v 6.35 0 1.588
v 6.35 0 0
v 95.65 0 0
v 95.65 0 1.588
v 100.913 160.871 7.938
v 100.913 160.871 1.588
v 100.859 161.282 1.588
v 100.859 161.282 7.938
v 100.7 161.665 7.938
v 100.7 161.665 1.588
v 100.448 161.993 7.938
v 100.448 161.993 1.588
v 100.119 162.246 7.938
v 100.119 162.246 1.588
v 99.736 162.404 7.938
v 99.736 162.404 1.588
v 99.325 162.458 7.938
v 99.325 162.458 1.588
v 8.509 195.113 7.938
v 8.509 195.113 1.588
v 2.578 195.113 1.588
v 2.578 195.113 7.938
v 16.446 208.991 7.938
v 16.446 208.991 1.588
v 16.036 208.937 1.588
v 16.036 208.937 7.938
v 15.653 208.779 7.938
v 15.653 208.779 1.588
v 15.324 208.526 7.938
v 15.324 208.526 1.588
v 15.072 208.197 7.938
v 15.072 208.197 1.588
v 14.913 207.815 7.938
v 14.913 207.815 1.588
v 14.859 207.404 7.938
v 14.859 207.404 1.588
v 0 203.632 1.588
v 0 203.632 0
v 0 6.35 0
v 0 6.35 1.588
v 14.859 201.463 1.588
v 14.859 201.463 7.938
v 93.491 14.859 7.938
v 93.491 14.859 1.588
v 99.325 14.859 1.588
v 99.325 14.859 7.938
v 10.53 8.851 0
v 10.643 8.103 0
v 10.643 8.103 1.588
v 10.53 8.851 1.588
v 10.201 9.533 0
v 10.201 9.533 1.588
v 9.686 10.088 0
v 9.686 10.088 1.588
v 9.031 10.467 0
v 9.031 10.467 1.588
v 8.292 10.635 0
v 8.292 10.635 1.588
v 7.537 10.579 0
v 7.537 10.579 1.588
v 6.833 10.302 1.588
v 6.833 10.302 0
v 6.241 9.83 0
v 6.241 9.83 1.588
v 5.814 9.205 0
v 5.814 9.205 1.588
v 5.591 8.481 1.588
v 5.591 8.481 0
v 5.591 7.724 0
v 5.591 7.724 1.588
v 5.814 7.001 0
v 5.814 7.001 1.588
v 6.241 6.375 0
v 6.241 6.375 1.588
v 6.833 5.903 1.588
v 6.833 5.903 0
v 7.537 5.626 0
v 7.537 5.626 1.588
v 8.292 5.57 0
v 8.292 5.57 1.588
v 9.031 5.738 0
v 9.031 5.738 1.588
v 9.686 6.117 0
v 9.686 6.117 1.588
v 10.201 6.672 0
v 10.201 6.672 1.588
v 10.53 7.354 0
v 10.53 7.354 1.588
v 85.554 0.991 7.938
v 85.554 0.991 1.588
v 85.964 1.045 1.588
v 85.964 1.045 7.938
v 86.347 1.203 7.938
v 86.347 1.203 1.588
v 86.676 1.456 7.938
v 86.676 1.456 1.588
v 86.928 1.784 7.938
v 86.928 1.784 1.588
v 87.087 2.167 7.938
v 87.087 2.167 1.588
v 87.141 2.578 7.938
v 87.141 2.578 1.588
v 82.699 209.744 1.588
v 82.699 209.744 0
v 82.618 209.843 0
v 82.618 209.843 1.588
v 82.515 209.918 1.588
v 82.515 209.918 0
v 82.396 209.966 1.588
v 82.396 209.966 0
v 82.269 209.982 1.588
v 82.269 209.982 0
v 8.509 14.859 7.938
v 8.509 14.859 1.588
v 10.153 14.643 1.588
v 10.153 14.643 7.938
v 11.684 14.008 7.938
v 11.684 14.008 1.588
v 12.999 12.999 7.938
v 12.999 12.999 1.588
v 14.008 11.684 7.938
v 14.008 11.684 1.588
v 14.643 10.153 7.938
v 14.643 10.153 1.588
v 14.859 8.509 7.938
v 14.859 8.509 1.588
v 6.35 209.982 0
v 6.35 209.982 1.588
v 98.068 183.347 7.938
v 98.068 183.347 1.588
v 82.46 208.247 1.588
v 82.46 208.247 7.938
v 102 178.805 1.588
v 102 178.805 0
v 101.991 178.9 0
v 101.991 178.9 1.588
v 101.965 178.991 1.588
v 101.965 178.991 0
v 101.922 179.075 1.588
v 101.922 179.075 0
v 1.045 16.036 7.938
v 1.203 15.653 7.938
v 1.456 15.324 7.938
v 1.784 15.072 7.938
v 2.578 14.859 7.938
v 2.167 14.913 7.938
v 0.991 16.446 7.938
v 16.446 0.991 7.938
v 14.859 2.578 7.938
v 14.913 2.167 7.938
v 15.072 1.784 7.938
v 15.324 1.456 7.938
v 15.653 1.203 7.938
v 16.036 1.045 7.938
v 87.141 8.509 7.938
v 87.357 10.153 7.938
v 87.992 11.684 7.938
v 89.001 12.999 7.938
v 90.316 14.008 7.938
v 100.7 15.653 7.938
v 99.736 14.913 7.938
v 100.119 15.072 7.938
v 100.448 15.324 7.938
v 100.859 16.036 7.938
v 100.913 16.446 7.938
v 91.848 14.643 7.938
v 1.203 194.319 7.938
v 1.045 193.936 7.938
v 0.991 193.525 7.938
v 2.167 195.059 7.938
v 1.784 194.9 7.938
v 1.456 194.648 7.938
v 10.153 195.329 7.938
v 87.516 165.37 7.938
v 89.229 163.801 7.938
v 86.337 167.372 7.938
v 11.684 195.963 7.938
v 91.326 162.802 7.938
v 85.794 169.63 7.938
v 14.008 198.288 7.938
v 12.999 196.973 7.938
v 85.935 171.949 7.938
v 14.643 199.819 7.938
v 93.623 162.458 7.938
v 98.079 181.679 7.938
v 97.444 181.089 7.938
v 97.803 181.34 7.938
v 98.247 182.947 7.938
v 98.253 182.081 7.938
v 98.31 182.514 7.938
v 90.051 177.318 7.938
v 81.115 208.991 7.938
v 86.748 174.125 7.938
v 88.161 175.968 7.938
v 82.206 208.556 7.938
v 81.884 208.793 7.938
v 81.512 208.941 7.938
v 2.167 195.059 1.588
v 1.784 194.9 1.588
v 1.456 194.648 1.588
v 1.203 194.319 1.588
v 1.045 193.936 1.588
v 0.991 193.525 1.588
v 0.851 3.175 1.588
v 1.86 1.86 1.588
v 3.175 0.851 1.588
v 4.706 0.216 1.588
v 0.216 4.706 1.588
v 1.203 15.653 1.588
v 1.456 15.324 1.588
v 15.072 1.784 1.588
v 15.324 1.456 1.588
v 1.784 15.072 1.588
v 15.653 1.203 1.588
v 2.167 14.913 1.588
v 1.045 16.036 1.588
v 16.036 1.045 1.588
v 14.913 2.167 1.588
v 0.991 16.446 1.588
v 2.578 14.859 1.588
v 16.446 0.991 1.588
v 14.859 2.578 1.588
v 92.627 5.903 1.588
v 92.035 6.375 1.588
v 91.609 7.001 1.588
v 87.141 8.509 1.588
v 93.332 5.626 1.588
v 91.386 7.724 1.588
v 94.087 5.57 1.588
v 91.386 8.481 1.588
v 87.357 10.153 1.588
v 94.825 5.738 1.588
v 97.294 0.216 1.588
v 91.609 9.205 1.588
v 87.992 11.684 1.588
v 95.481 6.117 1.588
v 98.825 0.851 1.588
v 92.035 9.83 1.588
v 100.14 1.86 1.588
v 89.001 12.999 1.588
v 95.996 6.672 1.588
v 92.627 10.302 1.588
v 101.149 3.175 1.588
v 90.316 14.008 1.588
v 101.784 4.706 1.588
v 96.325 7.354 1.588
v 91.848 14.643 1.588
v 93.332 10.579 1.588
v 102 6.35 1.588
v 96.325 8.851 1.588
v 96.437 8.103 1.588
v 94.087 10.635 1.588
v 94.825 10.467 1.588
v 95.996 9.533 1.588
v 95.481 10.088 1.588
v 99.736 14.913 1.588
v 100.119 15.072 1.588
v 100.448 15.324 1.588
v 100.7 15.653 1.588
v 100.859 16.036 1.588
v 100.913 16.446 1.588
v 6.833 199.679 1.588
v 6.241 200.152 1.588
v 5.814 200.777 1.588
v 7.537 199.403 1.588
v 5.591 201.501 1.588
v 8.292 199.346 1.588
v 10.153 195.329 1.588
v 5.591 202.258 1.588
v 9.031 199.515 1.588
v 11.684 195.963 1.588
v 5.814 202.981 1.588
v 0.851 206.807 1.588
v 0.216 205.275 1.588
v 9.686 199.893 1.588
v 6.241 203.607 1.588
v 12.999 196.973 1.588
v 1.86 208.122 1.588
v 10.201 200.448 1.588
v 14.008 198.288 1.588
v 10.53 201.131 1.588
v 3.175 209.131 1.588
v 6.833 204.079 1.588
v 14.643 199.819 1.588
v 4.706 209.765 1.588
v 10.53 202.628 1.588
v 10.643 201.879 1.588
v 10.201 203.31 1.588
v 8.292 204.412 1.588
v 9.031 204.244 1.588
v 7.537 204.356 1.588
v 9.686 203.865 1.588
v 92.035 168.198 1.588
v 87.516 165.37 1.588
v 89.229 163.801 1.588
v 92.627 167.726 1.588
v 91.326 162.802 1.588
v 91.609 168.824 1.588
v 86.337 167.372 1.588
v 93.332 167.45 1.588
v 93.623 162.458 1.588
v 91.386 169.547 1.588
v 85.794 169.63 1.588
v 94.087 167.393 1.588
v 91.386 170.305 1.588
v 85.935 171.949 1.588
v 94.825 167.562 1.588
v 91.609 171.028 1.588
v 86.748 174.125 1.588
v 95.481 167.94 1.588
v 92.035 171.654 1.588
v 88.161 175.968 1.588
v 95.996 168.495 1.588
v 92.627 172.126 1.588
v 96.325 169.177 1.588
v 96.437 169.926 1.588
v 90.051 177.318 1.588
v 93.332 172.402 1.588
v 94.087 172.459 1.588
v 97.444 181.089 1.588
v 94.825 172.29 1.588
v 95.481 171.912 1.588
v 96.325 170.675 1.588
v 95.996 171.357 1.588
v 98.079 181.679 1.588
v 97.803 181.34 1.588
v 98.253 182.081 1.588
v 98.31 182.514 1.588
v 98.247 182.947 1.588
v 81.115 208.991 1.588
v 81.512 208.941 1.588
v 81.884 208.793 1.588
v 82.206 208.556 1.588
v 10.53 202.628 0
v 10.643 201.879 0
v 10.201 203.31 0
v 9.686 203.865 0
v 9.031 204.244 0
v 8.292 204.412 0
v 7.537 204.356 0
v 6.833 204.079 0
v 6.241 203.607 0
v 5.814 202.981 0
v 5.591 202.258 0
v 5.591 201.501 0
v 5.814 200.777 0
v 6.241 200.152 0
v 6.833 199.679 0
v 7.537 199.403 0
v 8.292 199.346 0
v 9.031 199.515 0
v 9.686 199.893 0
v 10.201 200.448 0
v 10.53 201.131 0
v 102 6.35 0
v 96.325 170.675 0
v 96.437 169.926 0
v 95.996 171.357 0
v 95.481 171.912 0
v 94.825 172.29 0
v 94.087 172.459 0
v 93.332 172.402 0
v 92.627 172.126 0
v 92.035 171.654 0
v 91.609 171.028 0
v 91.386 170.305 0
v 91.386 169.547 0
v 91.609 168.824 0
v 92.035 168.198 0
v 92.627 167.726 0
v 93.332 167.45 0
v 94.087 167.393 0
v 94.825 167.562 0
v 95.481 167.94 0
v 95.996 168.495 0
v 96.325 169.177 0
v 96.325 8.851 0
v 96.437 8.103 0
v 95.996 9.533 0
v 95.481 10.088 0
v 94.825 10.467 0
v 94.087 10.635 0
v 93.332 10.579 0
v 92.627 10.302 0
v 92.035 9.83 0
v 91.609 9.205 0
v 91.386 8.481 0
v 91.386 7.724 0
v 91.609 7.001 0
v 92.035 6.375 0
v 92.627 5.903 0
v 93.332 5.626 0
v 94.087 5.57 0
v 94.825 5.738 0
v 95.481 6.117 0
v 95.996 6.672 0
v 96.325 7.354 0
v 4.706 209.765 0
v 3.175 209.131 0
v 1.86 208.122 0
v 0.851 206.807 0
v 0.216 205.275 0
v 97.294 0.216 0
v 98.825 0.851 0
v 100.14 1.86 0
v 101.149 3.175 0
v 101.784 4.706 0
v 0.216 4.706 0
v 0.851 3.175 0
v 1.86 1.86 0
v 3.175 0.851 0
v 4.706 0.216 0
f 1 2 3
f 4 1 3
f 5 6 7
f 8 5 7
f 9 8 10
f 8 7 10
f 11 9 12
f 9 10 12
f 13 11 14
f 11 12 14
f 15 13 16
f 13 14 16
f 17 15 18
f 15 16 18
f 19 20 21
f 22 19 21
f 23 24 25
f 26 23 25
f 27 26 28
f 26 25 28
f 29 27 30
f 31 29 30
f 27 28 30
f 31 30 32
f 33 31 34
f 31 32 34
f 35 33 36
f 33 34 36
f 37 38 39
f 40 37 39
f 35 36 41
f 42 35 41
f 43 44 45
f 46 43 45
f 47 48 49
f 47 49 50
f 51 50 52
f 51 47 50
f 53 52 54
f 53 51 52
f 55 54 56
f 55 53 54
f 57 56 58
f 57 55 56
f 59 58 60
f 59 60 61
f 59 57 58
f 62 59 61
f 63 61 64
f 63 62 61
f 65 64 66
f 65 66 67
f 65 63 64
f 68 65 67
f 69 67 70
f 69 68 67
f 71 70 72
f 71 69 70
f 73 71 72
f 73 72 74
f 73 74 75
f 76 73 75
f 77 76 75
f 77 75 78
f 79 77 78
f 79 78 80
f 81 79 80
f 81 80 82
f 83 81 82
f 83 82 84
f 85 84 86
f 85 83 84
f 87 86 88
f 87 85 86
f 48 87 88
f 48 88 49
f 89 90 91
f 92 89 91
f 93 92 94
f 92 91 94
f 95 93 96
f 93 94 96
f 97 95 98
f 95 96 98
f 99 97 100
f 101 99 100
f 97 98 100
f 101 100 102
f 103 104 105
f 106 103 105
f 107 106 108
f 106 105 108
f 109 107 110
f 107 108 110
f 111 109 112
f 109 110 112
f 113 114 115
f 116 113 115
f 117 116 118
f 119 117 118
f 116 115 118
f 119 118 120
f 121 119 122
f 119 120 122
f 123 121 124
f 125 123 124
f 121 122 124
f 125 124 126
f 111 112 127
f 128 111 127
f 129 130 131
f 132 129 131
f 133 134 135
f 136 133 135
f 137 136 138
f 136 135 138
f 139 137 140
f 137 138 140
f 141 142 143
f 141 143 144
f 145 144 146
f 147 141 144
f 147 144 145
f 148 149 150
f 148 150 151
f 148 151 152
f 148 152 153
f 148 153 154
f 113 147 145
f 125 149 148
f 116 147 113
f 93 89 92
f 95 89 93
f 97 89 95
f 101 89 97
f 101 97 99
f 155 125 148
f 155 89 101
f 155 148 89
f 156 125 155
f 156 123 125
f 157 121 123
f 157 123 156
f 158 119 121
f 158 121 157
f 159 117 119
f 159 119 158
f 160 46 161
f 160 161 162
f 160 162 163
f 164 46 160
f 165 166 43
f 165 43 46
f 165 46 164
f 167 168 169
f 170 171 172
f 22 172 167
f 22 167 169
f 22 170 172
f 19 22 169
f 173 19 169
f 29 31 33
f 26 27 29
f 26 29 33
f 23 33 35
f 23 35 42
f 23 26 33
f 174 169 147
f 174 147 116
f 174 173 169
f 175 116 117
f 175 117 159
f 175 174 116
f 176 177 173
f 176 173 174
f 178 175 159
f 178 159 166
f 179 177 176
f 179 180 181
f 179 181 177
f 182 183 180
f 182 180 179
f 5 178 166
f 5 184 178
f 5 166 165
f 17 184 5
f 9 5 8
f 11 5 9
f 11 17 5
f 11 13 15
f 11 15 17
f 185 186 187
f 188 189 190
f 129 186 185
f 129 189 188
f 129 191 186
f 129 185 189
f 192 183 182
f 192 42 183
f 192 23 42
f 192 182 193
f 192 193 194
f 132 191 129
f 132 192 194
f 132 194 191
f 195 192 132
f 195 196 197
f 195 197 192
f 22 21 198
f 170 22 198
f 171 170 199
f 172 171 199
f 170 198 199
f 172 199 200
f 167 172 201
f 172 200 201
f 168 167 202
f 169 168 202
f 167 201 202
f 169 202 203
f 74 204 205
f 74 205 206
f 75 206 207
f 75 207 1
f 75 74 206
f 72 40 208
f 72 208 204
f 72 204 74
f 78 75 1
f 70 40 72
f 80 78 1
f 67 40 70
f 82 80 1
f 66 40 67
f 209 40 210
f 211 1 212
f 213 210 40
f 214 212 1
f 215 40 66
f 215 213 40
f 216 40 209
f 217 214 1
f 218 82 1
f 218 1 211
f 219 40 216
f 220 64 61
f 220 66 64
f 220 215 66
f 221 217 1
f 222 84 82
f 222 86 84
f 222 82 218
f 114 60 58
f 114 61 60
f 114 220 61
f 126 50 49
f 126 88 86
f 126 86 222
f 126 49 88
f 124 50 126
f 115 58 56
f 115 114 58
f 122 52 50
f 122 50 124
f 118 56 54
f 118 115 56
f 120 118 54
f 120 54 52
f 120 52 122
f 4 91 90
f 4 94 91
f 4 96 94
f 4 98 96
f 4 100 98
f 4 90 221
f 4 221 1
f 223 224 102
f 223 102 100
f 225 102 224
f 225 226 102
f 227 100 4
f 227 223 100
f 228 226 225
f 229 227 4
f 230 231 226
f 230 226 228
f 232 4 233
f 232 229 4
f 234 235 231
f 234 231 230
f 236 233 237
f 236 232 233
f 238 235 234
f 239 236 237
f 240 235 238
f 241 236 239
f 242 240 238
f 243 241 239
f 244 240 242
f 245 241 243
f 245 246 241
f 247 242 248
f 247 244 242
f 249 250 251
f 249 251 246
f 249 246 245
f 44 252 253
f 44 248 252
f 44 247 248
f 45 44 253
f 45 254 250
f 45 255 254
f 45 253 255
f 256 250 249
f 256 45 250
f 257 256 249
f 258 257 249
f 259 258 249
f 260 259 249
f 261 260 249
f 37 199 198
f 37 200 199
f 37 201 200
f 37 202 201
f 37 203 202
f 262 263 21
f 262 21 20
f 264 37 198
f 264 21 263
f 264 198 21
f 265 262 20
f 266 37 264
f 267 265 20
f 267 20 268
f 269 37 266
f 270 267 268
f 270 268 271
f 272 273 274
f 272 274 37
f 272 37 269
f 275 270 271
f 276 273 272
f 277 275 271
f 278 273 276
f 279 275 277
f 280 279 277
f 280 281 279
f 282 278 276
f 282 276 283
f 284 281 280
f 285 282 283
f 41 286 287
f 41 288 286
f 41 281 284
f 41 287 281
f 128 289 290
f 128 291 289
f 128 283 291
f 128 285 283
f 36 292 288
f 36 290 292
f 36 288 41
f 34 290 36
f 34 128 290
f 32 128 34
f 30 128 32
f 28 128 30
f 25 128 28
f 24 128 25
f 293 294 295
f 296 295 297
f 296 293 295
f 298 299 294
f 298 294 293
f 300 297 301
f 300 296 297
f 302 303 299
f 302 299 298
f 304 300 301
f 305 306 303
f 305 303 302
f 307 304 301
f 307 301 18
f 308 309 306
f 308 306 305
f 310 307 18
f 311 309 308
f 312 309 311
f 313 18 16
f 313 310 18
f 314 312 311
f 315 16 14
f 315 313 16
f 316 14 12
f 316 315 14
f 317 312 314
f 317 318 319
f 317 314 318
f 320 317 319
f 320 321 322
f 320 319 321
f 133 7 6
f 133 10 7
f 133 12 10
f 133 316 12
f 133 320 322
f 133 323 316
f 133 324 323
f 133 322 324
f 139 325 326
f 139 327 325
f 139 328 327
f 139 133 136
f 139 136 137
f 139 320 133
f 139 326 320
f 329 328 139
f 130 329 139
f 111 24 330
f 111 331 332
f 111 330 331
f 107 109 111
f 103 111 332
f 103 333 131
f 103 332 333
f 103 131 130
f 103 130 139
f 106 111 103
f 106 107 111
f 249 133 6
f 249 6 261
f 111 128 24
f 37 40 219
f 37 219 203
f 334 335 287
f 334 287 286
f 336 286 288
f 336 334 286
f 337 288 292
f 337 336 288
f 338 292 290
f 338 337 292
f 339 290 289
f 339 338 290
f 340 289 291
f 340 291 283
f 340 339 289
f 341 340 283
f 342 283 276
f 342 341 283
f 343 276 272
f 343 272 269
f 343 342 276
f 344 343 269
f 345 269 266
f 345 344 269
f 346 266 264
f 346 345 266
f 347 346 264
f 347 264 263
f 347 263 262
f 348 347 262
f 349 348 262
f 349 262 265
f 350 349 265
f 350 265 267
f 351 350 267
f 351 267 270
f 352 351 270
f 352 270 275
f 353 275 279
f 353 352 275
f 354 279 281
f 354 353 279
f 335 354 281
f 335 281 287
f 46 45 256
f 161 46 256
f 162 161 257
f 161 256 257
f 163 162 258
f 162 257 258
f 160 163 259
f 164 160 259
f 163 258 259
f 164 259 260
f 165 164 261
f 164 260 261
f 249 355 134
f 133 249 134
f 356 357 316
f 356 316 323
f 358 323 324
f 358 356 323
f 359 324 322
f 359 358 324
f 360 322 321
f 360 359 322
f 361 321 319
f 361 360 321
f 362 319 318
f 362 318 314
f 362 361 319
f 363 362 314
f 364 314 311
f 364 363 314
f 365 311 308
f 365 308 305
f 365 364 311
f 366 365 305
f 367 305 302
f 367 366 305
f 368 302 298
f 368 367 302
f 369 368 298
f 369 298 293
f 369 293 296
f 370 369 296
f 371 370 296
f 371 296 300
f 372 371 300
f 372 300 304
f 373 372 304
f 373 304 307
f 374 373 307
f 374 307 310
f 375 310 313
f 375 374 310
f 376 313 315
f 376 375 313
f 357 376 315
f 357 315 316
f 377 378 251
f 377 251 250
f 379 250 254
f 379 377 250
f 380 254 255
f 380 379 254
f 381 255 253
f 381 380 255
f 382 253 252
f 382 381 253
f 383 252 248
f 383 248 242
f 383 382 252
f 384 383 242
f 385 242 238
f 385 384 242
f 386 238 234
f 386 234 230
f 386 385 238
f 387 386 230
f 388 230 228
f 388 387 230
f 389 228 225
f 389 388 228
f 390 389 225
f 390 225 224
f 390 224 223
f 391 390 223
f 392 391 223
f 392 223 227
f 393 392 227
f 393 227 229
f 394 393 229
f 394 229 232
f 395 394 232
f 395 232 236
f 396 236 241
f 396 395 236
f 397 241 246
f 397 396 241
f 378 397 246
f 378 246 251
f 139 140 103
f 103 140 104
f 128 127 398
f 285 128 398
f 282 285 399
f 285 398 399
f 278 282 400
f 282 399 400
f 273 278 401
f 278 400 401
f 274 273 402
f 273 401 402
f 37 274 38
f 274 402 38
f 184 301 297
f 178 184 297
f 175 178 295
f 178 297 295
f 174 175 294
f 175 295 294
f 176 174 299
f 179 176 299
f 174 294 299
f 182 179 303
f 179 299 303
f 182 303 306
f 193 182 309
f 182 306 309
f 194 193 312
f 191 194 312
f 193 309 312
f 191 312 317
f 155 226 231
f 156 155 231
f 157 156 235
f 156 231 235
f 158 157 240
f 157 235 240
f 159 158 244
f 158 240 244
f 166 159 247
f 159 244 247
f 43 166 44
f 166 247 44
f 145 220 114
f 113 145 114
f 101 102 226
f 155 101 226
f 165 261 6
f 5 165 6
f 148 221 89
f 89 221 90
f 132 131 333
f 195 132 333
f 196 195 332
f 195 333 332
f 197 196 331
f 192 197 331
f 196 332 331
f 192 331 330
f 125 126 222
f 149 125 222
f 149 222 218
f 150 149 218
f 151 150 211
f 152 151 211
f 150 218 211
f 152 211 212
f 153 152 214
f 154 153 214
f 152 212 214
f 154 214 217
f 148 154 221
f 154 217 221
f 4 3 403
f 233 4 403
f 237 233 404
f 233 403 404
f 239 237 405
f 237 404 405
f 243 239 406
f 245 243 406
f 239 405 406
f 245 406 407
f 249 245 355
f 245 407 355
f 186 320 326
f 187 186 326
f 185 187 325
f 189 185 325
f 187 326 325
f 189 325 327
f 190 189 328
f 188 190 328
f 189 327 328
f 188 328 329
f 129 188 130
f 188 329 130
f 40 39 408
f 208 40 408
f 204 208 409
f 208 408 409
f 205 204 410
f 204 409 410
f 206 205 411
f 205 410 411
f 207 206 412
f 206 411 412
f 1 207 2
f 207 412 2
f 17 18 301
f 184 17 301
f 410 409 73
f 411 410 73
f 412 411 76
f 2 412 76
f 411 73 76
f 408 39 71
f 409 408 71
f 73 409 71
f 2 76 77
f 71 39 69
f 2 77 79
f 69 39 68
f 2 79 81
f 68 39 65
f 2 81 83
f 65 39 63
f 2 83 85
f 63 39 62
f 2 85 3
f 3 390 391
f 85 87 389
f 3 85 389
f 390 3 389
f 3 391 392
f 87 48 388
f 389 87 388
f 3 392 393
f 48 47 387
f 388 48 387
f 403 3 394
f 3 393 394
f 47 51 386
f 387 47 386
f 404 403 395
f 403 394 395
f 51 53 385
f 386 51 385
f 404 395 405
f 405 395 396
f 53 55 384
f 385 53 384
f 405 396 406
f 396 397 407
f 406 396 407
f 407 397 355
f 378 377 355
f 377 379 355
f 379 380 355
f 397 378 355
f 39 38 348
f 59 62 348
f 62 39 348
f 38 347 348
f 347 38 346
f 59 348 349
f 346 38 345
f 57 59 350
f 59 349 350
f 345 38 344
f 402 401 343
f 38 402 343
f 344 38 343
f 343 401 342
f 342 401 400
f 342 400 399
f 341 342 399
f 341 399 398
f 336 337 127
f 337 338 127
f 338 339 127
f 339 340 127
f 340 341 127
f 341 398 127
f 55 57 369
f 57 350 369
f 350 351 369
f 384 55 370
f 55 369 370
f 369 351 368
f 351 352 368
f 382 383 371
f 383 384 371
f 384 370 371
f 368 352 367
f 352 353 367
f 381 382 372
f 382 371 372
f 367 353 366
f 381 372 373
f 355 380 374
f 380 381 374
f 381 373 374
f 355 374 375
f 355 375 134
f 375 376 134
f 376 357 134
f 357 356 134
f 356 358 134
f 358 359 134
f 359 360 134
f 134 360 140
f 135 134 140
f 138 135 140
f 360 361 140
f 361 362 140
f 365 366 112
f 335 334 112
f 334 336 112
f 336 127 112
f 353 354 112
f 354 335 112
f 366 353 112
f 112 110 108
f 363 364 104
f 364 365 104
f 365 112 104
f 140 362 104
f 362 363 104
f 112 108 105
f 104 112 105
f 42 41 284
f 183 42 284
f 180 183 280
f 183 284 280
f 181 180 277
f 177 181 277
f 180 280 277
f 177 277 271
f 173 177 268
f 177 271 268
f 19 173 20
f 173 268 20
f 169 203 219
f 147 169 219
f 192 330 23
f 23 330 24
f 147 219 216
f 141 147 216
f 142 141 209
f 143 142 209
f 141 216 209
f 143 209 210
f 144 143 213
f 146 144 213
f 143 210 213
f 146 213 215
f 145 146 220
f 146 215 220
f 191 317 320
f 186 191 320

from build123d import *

# Parameters (mm, degrees)
F0_R     = 2.54
F1_DEPTH = 1.5875
F3_DEPTH = 6.35


with BuildPart() as f1:
    # F0 (on Top) → F1 (new body)
    with BuildSketch(Plane.XY):
        with BuildLine():
            ThreePointArc((0, 6.35), (1.859872, 1.859872), (6.35, 0))
            Line((6.35, 0), (95.65005, 0))
            ThreePointArc((95.65005, 0), (100.140178, 1.859872), (102.00005, 6.35))
            Line((102.00005, 6.35), (102.00005, 178.805276))
            ThreePointArc((102.00005, 178.805276), (101.980273, 178.945639), (101.922484, 179.075074))
            Line((101.922484, 179.075074), (82.699306, 209.743598))
            ThreePointArc((82.699306, 209.743598), (82.514847, 209.918278), (82.268873, 209.9818))
            Line((82.268873, 209.9818), (6.35, 209.9818))
            ThreePointArc((6.35, 209.9818), (1.859872, 208.121928), (0, 203.6318))
            Line((0, 203.6318), (0, 6.35))
        make_face()
        with Locations((8.1026, 8.1026)):
            Circle(F0_R, mode=Mode.SUBTRACT)
        with Locations((93.89745, 8.1026)):
            Circle(F0_R, mode=Mode.SUBTRACT)
        with Locations((8.1026, 201.8792)):
            Circle(F0_R, mode=Mode.SUBTRACT)
        with Locations((93.89745, 169.926)):
            Circle(F0_R, mode=Mode.SUBTRACT)
    extrude(amount=F1_DEPTH)

    # F2 (on face) → F3 (join)
    with BuildSketch(Plane.XY.offset(1.5875)):
        with BuildLine():
            Line((81.1149, 208.9912), (16.4465, 208.9912))
            ThreePointArc((16.4465, 208.9912), (15.323968, 208.526232), (14.859, 207.4037))
            Line((14.859, 207.4037), (14.859, 201.46264))
            ThreePointArc((14.859, 201.46264), (12.999128, 196.972512), (8.509, 195.11264))
            Line((8.509, 195.11264), (2.5781, 195.11264))
            ThreePointArc((2.5781, 195.11264), (1.455568, 194.647672), (0.9906, 193.52514))
            Line((0.9906, 193.52514), (0.9906, 16.4465))
            ThreePointArc((0.9906, 16.4465), (1.455568, 15.323968), (2.5781, 14.859))
            Line((2.5781, 14.859), (8.509, 14.859))
            ThreePointArc((8.509, 14.859), (12.999128, 12.999128), (14.859, 8.509))
            Line((14.859, 8.509), (14.859, 2.5781))
            ThreePointArc((14.859, 2.5781), (15.323968, 1.455568), (16.4465, 0.9906))
            Line((16.4465, 0.9906), (85.55355, 0.9906))
            ThreePointArc((85.55355, 0.9906), (86.676082, 1.455568), (87.14105, 2.5781))
            Line((87.14105, 2.5781), (87.14105, 8.509))
            ThreePointArc((87.14105, 8.509), (89.000922, 12.999128), (93.49105, 14.859))
            Line((93.49105, 14.859), (99.325214, 14.859))
            ThreePointArc((99.325214, 14.859), (100.447746, 15.323968), (100.912714, 16.4465))
            Line((100.912714, 16.4465), (100.912714, 160.8709))
            ThreePointArc((100.912714, 160.8709), (100.447746, 161.993432), (99.325214, 162.4584))
            Line((99.325214, 162.4584), (93.622914, 162.4584))
            ThreePointArc((93.622914, 162.4584), (85.981627, 168.480706), (90.051433, 177.317794))
            Line((90.051433, 177.317794), (97.443973, 181.089289))
            ThreePointArc((97.443973, 181.089289), (98.2527, 182.080608), (98.067638, 183.346508))
            Line((98.067638, 183.346508), (82.460005, 208.246818))
            ThreePointArc((82.460005, 208.246818), (81.88357, 208.792694), (81.1149, 208.9912))
        make_face()
    extrude(amount=F3_DEPTH)


solid = f1.part
